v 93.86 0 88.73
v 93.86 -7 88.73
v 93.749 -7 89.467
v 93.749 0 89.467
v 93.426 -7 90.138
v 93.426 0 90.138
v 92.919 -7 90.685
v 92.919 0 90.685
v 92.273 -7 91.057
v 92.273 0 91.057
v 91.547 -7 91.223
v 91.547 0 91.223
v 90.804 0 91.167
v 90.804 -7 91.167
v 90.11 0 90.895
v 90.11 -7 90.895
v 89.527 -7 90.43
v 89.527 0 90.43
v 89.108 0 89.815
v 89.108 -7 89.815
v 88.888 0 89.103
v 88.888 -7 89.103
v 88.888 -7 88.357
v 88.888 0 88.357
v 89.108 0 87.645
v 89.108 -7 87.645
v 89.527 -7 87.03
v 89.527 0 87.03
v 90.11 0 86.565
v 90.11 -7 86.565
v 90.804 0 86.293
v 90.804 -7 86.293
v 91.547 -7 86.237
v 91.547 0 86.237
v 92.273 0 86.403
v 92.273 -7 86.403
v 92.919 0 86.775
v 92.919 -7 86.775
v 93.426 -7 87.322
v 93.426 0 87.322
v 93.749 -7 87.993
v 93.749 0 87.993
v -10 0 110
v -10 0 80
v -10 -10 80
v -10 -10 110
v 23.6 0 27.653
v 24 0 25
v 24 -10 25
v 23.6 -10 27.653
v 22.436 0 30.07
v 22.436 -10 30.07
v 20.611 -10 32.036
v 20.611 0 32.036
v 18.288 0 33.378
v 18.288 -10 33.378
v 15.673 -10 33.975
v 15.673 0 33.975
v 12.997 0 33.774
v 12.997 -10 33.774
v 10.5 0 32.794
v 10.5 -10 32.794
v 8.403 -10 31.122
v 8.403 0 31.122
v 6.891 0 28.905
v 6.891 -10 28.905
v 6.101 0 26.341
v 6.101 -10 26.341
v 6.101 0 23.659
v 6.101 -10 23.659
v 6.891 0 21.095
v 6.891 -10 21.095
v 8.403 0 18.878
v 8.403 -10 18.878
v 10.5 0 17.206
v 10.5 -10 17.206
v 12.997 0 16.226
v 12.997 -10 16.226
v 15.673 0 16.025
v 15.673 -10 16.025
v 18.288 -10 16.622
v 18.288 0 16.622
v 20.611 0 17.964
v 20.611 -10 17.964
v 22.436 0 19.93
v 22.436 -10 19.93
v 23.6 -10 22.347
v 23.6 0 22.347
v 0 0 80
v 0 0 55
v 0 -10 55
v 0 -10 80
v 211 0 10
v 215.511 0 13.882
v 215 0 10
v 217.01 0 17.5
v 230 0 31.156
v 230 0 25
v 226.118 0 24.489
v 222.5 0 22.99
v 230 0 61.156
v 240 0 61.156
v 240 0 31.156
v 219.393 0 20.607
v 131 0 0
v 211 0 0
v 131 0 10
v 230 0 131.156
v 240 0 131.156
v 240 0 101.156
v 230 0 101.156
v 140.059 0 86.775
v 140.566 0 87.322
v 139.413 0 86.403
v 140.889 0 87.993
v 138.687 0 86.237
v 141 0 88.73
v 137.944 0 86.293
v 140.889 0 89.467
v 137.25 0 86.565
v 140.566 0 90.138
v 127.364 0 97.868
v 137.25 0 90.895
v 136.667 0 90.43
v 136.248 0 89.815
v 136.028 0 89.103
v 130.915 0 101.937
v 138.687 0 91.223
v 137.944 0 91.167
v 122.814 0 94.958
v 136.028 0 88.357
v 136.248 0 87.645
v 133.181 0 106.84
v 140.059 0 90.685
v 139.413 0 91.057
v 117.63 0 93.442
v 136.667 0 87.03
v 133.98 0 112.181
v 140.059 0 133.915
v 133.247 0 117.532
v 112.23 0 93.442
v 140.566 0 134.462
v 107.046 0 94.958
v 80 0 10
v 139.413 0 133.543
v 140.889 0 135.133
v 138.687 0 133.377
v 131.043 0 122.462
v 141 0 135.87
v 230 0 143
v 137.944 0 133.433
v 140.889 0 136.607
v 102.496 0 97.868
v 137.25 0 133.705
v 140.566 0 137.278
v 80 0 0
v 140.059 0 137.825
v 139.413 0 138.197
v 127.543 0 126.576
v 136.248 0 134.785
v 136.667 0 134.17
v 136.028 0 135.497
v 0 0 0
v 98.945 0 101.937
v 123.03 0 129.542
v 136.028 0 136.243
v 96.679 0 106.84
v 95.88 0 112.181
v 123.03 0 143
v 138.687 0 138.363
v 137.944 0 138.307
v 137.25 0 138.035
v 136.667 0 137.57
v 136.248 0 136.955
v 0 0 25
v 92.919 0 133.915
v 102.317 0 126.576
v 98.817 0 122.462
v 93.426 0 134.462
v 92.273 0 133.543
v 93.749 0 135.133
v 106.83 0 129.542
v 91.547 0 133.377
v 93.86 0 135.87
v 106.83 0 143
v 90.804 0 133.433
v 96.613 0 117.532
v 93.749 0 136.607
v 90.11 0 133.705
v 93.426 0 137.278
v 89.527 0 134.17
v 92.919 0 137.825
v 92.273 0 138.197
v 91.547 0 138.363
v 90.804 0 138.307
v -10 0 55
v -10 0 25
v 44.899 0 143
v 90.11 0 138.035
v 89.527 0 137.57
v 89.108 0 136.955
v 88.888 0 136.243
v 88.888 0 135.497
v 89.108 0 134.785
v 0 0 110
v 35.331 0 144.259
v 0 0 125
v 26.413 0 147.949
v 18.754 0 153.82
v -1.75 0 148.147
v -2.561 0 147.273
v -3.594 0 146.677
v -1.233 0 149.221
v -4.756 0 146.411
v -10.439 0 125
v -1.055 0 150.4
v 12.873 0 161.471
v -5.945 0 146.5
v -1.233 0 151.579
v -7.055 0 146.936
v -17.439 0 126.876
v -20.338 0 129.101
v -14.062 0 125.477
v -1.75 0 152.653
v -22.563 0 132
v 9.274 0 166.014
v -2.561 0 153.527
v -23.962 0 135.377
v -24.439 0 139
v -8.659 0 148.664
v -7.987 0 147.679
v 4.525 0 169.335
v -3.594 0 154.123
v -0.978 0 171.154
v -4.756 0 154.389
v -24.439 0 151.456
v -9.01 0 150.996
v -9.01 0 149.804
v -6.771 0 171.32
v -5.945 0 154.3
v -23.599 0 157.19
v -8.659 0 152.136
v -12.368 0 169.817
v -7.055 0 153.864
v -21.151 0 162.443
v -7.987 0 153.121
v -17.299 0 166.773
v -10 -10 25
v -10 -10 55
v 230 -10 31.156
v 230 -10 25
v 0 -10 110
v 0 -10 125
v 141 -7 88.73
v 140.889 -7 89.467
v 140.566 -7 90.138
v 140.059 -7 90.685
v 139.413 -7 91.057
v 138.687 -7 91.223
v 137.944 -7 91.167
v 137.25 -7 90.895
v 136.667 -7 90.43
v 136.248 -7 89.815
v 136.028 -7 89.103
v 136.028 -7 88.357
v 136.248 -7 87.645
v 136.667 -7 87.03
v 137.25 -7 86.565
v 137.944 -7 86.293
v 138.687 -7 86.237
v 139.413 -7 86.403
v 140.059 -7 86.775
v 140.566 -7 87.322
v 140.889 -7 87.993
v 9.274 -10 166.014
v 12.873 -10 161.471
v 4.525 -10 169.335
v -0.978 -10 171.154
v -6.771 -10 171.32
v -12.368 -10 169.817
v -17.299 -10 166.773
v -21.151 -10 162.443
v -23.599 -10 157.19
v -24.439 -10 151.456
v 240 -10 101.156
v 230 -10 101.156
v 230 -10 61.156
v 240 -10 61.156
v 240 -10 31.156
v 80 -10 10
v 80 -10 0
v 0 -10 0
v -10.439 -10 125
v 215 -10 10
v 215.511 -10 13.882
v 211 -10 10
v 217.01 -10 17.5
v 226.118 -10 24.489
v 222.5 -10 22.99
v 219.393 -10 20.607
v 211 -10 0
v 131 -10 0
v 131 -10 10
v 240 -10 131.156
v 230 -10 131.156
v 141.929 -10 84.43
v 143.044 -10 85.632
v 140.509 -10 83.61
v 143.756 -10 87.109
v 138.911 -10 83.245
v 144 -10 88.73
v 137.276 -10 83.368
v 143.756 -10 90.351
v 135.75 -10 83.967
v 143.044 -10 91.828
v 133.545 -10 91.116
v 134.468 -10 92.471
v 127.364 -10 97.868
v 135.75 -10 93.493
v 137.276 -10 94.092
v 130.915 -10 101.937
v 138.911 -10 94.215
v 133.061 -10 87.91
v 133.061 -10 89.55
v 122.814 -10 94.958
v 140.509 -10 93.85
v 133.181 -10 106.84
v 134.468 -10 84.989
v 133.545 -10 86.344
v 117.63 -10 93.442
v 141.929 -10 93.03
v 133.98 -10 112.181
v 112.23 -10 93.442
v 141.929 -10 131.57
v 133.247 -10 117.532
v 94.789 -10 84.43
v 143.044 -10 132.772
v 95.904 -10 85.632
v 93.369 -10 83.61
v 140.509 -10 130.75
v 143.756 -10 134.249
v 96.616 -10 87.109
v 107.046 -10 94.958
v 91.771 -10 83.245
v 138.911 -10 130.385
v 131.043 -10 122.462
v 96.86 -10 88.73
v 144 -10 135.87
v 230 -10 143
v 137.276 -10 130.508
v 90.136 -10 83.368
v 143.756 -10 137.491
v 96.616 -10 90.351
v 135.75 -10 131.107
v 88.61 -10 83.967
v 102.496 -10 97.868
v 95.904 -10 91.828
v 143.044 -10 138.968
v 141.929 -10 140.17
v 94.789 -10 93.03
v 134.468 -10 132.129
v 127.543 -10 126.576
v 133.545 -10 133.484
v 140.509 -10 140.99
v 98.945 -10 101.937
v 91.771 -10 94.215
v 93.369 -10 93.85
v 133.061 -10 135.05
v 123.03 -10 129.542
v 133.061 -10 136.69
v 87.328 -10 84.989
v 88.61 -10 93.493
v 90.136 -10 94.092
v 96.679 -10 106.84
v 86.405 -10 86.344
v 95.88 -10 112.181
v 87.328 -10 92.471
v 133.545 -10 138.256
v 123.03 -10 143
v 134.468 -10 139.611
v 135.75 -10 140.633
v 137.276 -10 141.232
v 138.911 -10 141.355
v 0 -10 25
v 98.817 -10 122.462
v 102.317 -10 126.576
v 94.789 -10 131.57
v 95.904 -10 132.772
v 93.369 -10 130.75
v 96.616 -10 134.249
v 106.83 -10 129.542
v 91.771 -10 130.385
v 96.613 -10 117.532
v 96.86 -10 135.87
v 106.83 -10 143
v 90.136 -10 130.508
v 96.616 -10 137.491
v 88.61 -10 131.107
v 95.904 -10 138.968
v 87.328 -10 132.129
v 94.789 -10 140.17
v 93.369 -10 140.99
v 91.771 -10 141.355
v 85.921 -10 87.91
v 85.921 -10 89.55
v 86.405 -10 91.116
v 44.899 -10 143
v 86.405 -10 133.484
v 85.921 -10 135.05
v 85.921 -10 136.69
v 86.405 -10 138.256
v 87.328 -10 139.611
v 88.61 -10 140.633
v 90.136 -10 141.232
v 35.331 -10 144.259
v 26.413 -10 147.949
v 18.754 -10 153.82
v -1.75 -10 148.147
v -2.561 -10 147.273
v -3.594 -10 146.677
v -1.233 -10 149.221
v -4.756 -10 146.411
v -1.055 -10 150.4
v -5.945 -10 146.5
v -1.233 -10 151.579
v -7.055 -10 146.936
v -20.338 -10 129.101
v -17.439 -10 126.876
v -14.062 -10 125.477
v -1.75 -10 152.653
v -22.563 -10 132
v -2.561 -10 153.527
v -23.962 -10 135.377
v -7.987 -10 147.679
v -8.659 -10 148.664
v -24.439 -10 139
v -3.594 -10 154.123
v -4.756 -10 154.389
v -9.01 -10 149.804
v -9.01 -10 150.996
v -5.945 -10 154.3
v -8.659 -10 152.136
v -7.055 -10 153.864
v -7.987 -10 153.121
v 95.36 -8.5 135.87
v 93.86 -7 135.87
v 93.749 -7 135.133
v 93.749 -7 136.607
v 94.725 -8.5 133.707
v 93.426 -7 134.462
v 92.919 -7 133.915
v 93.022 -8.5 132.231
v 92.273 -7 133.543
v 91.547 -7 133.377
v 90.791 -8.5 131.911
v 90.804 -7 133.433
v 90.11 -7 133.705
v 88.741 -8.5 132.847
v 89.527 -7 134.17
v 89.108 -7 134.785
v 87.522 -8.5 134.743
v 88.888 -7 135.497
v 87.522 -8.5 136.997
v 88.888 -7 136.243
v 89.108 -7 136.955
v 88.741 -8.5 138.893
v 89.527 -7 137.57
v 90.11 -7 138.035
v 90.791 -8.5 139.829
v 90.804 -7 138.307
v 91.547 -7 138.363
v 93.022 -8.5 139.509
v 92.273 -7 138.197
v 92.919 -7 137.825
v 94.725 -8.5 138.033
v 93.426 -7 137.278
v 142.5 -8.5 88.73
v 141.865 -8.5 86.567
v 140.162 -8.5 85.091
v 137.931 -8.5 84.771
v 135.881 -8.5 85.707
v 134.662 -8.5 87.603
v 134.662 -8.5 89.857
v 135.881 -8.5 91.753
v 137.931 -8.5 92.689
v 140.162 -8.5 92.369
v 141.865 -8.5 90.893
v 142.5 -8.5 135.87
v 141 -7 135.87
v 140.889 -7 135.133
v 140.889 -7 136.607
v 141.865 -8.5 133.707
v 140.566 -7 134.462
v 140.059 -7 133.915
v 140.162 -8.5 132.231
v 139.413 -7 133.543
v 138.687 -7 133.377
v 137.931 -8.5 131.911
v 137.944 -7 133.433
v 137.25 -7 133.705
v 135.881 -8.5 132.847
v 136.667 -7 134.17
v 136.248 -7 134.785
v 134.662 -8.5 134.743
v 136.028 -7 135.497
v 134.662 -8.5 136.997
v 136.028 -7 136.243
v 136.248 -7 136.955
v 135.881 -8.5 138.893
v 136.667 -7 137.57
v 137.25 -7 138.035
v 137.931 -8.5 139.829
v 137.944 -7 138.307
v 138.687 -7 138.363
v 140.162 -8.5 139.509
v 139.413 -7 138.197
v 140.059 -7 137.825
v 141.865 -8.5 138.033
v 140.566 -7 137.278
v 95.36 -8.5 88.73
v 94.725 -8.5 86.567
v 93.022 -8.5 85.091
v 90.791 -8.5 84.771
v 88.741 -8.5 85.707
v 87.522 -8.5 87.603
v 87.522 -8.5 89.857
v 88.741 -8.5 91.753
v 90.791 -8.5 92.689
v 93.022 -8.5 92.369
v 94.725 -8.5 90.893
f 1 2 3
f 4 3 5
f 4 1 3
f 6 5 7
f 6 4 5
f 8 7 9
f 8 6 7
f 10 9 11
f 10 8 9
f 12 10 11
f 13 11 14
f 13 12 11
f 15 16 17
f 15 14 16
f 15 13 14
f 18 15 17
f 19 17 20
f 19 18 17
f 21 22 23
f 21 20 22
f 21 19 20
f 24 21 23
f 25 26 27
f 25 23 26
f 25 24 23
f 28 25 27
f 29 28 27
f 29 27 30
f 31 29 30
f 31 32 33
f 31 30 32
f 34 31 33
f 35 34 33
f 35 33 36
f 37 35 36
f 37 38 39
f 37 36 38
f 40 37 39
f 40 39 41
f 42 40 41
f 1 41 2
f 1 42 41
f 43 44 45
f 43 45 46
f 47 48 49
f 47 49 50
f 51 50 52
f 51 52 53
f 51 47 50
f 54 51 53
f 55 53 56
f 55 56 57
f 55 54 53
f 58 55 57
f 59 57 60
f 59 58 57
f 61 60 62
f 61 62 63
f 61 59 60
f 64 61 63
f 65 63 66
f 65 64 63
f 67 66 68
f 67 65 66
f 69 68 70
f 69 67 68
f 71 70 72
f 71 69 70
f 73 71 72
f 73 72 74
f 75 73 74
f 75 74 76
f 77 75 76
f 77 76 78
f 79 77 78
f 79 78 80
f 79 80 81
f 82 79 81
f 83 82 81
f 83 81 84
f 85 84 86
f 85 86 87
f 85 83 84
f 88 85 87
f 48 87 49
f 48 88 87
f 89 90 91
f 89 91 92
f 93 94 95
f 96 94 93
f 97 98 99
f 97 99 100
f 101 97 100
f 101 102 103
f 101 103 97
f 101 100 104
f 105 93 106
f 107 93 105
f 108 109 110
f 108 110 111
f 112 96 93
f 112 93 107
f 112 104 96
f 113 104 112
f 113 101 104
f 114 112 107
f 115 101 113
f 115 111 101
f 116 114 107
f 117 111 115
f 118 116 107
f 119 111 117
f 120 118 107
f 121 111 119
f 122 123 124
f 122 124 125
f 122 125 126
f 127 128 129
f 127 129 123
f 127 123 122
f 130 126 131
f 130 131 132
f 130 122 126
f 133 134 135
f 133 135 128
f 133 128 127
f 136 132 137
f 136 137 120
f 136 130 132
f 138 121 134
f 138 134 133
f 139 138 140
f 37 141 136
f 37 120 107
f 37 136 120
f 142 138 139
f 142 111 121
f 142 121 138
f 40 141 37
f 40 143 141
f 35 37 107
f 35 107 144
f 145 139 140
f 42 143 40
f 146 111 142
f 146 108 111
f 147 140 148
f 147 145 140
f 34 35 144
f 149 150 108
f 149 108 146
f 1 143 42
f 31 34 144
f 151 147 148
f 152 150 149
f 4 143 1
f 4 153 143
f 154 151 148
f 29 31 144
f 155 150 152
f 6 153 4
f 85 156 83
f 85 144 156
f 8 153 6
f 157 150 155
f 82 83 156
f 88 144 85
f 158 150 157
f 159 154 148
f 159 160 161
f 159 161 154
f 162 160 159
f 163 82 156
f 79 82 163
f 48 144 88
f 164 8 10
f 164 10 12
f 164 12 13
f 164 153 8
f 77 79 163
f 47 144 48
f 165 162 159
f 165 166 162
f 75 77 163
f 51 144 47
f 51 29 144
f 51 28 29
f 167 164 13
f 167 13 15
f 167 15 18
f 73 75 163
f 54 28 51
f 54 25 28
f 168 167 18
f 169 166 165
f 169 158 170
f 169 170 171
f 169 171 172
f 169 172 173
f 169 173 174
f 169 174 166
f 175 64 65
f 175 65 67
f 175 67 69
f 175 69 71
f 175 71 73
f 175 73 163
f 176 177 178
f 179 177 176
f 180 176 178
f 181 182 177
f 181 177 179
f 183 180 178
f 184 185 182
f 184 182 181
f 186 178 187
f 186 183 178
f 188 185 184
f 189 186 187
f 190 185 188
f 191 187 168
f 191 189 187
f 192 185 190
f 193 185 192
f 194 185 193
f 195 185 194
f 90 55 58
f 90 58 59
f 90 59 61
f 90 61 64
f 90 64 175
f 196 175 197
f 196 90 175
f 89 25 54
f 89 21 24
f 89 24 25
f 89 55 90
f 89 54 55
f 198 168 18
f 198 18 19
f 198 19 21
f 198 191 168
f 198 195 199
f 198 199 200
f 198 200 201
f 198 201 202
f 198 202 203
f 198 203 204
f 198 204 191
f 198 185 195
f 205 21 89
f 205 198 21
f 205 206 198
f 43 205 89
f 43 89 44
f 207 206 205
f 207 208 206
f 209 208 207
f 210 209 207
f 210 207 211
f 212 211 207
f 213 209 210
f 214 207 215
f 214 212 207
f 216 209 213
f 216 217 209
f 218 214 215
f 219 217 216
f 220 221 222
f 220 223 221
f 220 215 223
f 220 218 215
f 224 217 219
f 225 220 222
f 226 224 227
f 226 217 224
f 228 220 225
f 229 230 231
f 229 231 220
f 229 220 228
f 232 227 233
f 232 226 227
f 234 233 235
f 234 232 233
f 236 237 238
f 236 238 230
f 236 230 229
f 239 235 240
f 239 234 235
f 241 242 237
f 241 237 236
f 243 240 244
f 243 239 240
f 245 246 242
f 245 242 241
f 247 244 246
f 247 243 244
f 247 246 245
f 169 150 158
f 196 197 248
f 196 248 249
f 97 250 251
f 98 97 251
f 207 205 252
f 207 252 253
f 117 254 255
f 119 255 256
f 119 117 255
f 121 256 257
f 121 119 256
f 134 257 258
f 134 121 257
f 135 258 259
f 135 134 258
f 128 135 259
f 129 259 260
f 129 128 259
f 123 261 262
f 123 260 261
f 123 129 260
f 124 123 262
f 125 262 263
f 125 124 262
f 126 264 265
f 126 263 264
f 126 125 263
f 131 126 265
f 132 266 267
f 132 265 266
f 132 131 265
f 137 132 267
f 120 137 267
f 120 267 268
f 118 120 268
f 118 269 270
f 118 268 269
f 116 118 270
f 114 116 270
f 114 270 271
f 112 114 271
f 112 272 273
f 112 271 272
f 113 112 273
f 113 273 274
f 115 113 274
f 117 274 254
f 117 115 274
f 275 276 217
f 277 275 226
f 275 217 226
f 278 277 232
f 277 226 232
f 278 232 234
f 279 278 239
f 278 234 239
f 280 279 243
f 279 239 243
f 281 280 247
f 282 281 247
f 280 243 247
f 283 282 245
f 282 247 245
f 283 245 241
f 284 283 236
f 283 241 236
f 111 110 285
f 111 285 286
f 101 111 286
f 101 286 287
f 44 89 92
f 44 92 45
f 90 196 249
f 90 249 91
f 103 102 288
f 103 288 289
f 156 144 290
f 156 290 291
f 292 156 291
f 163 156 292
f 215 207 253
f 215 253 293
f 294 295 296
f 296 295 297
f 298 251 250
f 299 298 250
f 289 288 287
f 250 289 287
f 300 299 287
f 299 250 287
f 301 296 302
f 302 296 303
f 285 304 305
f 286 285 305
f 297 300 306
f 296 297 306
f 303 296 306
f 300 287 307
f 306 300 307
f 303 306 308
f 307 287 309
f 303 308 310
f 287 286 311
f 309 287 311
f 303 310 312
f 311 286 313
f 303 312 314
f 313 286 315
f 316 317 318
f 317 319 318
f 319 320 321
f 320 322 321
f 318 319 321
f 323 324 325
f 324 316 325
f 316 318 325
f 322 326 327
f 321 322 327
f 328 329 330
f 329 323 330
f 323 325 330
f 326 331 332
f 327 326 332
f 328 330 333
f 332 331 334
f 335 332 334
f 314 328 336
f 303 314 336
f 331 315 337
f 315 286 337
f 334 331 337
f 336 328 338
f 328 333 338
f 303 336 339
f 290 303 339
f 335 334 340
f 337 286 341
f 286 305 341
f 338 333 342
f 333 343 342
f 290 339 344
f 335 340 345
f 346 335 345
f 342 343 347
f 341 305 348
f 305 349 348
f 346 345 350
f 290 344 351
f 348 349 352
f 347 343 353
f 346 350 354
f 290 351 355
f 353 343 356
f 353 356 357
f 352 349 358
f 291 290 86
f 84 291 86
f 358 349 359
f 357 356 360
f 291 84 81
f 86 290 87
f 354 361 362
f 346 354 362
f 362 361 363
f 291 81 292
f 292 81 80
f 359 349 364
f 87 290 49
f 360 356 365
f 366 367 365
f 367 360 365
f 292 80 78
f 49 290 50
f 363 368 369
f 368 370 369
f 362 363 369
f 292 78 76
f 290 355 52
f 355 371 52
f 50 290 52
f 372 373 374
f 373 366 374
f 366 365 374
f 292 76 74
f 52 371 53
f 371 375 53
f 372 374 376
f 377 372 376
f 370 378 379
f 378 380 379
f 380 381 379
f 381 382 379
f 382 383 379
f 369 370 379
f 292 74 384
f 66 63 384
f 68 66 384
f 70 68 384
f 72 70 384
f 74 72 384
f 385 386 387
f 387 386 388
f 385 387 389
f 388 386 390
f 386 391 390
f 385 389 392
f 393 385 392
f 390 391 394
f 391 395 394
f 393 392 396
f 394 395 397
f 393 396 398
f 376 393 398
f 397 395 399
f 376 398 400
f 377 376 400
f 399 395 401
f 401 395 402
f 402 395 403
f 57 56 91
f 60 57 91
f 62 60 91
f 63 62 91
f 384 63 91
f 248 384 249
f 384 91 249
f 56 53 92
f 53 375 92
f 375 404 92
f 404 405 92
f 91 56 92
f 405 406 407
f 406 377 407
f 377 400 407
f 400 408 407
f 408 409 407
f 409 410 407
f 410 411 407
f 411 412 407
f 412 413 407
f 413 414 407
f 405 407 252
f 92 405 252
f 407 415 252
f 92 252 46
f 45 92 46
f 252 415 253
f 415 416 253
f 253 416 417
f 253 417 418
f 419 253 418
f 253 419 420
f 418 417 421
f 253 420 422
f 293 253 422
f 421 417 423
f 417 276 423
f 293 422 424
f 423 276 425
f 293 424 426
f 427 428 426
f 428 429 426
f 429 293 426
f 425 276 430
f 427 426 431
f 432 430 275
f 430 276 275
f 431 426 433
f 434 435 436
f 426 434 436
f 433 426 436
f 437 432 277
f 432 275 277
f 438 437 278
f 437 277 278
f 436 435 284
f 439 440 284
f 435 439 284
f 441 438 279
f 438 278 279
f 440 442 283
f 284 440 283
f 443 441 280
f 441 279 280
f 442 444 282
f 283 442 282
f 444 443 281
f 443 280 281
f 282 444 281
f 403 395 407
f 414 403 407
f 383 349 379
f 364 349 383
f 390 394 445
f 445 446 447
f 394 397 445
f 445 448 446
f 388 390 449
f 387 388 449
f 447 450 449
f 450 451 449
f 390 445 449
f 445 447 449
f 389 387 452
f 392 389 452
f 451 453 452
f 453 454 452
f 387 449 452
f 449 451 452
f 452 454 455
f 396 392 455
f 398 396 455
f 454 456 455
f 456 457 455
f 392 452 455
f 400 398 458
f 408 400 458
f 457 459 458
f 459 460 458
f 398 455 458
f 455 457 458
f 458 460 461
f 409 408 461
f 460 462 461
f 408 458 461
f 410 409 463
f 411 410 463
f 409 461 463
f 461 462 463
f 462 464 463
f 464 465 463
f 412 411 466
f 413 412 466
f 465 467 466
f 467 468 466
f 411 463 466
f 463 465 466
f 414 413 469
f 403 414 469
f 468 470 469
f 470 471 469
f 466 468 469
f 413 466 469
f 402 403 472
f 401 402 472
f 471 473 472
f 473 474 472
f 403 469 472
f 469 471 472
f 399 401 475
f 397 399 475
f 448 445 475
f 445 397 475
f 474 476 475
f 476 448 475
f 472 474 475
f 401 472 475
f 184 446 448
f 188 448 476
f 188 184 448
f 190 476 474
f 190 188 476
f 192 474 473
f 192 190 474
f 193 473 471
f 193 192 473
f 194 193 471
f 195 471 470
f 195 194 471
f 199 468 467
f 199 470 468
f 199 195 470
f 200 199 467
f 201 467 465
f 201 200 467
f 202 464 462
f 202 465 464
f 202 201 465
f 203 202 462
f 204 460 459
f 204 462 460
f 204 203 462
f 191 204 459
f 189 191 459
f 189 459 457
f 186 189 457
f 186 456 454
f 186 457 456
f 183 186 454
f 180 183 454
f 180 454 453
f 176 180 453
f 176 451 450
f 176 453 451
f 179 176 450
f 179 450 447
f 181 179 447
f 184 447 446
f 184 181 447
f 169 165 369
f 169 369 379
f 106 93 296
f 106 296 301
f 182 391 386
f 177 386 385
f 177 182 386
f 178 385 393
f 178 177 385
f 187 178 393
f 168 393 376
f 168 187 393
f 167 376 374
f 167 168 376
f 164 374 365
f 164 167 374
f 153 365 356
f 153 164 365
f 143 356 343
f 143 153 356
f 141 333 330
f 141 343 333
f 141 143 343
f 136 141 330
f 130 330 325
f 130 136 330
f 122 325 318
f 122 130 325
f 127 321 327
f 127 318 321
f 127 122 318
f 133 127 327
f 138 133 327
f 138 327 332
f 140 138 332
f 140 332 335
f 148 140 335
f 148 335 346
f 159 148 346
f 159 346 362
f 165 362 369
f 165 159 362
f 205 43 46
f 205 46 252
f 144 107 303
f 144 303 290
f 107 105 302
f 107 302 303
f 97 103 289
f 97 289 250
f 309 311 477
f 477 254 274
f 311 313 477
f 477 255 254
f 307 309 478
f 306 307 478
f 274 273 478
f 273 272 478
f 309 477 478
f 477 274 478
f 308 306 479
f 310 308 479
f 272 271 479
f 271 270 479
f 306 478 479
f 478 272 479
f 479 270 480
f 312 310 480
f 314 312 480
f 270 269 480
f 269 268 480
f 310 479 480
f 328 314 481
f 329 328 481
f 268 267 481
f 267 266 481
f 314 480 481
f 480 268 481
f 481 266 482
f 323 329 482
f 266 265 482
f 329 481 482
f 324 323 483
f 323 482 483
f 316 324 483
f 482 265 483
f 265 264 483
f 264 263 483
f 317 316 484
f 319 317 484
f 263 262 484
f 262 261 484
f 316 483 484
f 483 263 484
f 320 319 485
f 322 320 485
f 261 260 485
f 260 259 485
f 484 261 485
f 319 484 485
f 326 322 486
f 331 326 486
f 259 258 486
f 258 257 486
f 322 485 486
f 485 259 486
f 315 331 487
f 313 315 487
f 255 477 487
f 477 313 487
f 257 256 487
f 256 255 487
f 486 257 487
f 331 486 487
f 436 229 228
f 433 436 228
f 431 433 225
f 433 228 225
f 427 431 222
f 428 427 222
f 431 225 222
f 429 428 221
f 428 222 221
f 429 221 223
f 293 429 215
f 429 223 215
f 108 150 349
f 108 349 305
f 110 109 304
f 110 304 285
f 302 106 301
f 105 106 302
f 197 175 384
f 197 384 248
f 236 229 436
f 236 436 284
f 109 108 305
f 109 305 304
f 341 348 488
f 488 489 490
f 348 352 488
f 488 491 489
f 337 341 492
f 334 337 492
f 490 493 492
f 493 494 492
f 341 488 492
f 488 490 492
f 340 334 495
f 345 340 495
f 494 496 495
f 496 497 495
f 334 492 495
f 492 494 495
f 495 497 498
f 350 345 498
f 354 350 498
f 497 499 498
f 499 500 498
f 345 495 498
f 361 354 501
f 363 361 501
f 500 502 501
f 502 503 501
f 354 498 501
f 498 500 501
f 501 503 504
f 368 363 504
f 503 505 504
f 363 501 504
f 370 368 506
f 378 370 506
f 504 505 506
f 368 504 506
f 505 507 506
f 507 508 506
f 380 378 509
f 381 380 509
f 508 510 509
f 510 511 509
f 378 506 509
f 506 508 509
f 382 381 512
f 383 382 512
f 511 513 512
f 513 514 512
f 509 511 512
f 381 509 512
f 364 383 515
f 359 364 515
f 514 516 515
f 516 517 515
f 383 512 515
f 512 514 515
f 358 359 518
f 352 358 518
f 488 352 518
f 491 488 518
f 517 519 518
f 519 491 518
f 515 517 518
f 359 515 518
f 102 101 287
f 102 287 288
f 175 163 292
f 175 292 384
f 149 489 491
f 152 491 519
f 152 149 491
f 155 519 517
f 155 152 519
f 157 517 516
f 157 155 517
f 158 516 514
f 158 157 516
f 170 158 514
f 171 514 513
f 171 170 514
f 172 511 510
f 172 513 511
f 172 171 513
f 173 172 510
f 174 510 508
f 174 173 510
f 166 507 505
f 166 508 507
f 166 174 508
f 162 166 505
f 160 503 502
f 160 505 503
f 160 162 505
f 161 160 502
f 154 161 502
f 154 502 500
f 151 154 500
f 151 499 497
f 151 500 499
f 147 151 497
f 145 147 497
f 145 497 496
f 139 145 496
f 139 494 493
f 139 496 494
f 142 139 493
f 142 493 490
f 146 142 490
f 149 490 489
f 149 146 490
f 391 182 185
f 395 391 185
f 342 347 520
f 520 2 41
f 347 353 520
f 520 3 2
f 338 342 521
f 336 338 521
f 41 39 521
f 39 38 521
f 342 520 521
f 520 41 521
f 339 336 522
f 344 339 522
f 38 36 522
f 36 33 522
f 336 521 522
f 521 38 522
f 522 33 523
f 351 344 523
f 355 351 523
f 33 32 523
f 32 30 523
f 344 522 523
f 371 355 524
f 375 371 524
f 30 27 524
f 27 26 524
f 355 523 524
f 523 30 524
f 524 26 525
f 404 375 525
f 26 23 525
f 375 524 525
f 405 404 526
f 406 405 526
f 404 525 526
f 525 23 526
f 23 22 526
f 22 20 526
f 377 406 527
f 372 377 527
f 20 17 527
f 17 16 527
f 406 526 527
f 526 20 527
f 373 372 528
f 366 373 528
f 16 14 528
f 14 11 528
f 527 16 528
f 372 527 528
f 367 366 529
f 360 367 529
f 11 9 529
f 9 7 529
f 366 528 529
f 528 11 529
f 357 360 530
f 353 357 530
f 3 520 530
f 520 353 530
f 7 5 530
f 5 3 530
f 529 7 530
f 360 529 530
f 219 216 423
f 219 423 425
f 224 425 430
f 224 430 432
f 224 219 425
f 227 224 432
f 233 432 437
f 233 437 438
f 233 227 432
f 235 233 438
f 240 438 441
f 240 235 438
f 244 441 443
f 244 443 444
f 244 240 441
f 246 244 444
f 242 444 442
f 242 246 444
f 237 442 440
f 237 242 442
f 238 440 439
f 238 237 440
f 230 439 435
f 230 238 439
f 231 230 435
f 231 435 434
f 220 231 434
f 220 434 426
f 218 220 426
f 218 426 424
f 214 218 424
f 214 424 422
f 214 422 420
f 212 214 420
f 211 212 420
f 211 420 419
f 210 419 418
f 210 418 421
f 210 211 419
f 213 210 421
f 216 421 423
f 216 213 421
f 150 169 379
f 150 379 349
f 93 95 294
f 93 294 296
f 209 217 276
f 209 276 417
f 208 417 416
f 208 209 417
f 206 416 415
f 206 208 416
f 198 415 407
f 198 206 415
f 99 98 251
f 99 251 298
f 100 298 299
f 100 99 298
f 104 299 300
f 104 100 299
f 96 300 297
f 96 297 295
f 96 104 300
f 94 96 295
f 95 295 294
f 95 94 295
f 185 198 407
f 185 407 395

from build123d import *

# Parameters (mm, degrees)
SKETCH_R     = 9
SKETCH_R_2   = 4
PAD_DEPTH    = 10
SKETCH001_R  = 2.5
POCKET_DEPTH = 10.001
CHAMFER_SIZE = 3


with BuildPart() as part:
    # Sketch → Pad (new body)
    with BuildSketch(Plane.XZ):
        with BuildLine():
            Line((0, 0), (0, 25))
            Line((0, 25), (-10, 25))
            Line((-10, 25), (-10, 55))
            Line((-10, 55), (0, 55))
            Line((0, 55), (0, 80))
            Line((0, 80), (-10, 80))
            Line((-10, 80), (-10, 110))
            Line((-10, 110), (0, 110))
            Line((0, 110), (0, 125))
            Line((0, 125), (-10.439, 125))
            ThreePointArc((-24.439, 139), (-20.338495, 129.100505), (-10.439, 125))
            Line((-24.439, 139), (-24.439, 151.456))
            ThreePointArc((12.872585, 161.471439), (-9.623992, 170.772207), (-24.439, 151.456))
            ThreePointArc((12.872585, 161.471439), (26.413305, 147.948816), (44.899018, 143))
            Line((44.899018, 143), (230, 143))
            Line((230, 143), (230, 131.156))
            Line((230, 131.156), (240, 131.156))
            Line((240, 131.156), (240, 101.156))
            Line((240, 101.156), (230, 101.156))
            Line((230, 101.156), (230, 61.156))
            Line((230, 61.156), (240, 61.156))
            Line((240, 61.156), (240, 31.156))
            Line((240, 31.156), (230, 31.156))
            Line((230, 31.156), (230, 25))
            ThreePointArc((230, 25), (219.393398, 20.606602), (215, 10))
            Line((215, 10), (211, 10))
            Line((211, 10), (211, 0))
            Line((211, 0), (131, 0))
            Line((131, 0), (131, 10))
            Line((131, 10), (80, 10))
            Line((80, 10), (80, 0))
            Line((80, 0), (0, 0))
        make_face()
        with Locations((15, 25)):
            Circle(SKETCH_R, mode=Mode.SUBTRACT)
        with Locations((-5.055, 150.4)):
            Circle(SKETCH_R_2, mode=Mode.SUBTRACT)
    extrude(amount=PAD_DEPTH)

    # Sketch001 → Pocket (cut, through all)
    with BuildSketch(Plane.XZ):
        with Locations((91.36, 135.87)):
            Circle(SKETCH001_R)
        with Locations((138.5, 135.87)):
            Circle(SKETCH001_R)
        with Locations((91.36, 88.73)):
            Circle(SKETCH001_R)
        with Locations((138.5, 88.73)):
            Circle(SKETCH001_R)
        with BuildLine():
            ThreePointArc((106.83, 129.542172), (114.93, 93.25), (123.03, 129.542172))
            Line((123.03, 129.542172), (123.03, 177.012172))
            Line((106.83, 177.012172), (123.03, 177.012172))
            Line((106.83, 129.542172), (106.83, 177.012172))
        make_face()
    extrude(amount=POCKET_DEPTH, mode=Mode.SUBTRACT)

    # Chamfer
    chamfer_edges = [part.edges().sort_by_distance(p)[0] for p in [
        (136, -10, 135.87),
        (88.86, -10, 88.73),
        (88.86, -10, 135.87),
        (136, -10, 88.73),
    ]]
    chamfer(chamfer_edges, length=CHAMFER_SIZE)


solid = part.part
